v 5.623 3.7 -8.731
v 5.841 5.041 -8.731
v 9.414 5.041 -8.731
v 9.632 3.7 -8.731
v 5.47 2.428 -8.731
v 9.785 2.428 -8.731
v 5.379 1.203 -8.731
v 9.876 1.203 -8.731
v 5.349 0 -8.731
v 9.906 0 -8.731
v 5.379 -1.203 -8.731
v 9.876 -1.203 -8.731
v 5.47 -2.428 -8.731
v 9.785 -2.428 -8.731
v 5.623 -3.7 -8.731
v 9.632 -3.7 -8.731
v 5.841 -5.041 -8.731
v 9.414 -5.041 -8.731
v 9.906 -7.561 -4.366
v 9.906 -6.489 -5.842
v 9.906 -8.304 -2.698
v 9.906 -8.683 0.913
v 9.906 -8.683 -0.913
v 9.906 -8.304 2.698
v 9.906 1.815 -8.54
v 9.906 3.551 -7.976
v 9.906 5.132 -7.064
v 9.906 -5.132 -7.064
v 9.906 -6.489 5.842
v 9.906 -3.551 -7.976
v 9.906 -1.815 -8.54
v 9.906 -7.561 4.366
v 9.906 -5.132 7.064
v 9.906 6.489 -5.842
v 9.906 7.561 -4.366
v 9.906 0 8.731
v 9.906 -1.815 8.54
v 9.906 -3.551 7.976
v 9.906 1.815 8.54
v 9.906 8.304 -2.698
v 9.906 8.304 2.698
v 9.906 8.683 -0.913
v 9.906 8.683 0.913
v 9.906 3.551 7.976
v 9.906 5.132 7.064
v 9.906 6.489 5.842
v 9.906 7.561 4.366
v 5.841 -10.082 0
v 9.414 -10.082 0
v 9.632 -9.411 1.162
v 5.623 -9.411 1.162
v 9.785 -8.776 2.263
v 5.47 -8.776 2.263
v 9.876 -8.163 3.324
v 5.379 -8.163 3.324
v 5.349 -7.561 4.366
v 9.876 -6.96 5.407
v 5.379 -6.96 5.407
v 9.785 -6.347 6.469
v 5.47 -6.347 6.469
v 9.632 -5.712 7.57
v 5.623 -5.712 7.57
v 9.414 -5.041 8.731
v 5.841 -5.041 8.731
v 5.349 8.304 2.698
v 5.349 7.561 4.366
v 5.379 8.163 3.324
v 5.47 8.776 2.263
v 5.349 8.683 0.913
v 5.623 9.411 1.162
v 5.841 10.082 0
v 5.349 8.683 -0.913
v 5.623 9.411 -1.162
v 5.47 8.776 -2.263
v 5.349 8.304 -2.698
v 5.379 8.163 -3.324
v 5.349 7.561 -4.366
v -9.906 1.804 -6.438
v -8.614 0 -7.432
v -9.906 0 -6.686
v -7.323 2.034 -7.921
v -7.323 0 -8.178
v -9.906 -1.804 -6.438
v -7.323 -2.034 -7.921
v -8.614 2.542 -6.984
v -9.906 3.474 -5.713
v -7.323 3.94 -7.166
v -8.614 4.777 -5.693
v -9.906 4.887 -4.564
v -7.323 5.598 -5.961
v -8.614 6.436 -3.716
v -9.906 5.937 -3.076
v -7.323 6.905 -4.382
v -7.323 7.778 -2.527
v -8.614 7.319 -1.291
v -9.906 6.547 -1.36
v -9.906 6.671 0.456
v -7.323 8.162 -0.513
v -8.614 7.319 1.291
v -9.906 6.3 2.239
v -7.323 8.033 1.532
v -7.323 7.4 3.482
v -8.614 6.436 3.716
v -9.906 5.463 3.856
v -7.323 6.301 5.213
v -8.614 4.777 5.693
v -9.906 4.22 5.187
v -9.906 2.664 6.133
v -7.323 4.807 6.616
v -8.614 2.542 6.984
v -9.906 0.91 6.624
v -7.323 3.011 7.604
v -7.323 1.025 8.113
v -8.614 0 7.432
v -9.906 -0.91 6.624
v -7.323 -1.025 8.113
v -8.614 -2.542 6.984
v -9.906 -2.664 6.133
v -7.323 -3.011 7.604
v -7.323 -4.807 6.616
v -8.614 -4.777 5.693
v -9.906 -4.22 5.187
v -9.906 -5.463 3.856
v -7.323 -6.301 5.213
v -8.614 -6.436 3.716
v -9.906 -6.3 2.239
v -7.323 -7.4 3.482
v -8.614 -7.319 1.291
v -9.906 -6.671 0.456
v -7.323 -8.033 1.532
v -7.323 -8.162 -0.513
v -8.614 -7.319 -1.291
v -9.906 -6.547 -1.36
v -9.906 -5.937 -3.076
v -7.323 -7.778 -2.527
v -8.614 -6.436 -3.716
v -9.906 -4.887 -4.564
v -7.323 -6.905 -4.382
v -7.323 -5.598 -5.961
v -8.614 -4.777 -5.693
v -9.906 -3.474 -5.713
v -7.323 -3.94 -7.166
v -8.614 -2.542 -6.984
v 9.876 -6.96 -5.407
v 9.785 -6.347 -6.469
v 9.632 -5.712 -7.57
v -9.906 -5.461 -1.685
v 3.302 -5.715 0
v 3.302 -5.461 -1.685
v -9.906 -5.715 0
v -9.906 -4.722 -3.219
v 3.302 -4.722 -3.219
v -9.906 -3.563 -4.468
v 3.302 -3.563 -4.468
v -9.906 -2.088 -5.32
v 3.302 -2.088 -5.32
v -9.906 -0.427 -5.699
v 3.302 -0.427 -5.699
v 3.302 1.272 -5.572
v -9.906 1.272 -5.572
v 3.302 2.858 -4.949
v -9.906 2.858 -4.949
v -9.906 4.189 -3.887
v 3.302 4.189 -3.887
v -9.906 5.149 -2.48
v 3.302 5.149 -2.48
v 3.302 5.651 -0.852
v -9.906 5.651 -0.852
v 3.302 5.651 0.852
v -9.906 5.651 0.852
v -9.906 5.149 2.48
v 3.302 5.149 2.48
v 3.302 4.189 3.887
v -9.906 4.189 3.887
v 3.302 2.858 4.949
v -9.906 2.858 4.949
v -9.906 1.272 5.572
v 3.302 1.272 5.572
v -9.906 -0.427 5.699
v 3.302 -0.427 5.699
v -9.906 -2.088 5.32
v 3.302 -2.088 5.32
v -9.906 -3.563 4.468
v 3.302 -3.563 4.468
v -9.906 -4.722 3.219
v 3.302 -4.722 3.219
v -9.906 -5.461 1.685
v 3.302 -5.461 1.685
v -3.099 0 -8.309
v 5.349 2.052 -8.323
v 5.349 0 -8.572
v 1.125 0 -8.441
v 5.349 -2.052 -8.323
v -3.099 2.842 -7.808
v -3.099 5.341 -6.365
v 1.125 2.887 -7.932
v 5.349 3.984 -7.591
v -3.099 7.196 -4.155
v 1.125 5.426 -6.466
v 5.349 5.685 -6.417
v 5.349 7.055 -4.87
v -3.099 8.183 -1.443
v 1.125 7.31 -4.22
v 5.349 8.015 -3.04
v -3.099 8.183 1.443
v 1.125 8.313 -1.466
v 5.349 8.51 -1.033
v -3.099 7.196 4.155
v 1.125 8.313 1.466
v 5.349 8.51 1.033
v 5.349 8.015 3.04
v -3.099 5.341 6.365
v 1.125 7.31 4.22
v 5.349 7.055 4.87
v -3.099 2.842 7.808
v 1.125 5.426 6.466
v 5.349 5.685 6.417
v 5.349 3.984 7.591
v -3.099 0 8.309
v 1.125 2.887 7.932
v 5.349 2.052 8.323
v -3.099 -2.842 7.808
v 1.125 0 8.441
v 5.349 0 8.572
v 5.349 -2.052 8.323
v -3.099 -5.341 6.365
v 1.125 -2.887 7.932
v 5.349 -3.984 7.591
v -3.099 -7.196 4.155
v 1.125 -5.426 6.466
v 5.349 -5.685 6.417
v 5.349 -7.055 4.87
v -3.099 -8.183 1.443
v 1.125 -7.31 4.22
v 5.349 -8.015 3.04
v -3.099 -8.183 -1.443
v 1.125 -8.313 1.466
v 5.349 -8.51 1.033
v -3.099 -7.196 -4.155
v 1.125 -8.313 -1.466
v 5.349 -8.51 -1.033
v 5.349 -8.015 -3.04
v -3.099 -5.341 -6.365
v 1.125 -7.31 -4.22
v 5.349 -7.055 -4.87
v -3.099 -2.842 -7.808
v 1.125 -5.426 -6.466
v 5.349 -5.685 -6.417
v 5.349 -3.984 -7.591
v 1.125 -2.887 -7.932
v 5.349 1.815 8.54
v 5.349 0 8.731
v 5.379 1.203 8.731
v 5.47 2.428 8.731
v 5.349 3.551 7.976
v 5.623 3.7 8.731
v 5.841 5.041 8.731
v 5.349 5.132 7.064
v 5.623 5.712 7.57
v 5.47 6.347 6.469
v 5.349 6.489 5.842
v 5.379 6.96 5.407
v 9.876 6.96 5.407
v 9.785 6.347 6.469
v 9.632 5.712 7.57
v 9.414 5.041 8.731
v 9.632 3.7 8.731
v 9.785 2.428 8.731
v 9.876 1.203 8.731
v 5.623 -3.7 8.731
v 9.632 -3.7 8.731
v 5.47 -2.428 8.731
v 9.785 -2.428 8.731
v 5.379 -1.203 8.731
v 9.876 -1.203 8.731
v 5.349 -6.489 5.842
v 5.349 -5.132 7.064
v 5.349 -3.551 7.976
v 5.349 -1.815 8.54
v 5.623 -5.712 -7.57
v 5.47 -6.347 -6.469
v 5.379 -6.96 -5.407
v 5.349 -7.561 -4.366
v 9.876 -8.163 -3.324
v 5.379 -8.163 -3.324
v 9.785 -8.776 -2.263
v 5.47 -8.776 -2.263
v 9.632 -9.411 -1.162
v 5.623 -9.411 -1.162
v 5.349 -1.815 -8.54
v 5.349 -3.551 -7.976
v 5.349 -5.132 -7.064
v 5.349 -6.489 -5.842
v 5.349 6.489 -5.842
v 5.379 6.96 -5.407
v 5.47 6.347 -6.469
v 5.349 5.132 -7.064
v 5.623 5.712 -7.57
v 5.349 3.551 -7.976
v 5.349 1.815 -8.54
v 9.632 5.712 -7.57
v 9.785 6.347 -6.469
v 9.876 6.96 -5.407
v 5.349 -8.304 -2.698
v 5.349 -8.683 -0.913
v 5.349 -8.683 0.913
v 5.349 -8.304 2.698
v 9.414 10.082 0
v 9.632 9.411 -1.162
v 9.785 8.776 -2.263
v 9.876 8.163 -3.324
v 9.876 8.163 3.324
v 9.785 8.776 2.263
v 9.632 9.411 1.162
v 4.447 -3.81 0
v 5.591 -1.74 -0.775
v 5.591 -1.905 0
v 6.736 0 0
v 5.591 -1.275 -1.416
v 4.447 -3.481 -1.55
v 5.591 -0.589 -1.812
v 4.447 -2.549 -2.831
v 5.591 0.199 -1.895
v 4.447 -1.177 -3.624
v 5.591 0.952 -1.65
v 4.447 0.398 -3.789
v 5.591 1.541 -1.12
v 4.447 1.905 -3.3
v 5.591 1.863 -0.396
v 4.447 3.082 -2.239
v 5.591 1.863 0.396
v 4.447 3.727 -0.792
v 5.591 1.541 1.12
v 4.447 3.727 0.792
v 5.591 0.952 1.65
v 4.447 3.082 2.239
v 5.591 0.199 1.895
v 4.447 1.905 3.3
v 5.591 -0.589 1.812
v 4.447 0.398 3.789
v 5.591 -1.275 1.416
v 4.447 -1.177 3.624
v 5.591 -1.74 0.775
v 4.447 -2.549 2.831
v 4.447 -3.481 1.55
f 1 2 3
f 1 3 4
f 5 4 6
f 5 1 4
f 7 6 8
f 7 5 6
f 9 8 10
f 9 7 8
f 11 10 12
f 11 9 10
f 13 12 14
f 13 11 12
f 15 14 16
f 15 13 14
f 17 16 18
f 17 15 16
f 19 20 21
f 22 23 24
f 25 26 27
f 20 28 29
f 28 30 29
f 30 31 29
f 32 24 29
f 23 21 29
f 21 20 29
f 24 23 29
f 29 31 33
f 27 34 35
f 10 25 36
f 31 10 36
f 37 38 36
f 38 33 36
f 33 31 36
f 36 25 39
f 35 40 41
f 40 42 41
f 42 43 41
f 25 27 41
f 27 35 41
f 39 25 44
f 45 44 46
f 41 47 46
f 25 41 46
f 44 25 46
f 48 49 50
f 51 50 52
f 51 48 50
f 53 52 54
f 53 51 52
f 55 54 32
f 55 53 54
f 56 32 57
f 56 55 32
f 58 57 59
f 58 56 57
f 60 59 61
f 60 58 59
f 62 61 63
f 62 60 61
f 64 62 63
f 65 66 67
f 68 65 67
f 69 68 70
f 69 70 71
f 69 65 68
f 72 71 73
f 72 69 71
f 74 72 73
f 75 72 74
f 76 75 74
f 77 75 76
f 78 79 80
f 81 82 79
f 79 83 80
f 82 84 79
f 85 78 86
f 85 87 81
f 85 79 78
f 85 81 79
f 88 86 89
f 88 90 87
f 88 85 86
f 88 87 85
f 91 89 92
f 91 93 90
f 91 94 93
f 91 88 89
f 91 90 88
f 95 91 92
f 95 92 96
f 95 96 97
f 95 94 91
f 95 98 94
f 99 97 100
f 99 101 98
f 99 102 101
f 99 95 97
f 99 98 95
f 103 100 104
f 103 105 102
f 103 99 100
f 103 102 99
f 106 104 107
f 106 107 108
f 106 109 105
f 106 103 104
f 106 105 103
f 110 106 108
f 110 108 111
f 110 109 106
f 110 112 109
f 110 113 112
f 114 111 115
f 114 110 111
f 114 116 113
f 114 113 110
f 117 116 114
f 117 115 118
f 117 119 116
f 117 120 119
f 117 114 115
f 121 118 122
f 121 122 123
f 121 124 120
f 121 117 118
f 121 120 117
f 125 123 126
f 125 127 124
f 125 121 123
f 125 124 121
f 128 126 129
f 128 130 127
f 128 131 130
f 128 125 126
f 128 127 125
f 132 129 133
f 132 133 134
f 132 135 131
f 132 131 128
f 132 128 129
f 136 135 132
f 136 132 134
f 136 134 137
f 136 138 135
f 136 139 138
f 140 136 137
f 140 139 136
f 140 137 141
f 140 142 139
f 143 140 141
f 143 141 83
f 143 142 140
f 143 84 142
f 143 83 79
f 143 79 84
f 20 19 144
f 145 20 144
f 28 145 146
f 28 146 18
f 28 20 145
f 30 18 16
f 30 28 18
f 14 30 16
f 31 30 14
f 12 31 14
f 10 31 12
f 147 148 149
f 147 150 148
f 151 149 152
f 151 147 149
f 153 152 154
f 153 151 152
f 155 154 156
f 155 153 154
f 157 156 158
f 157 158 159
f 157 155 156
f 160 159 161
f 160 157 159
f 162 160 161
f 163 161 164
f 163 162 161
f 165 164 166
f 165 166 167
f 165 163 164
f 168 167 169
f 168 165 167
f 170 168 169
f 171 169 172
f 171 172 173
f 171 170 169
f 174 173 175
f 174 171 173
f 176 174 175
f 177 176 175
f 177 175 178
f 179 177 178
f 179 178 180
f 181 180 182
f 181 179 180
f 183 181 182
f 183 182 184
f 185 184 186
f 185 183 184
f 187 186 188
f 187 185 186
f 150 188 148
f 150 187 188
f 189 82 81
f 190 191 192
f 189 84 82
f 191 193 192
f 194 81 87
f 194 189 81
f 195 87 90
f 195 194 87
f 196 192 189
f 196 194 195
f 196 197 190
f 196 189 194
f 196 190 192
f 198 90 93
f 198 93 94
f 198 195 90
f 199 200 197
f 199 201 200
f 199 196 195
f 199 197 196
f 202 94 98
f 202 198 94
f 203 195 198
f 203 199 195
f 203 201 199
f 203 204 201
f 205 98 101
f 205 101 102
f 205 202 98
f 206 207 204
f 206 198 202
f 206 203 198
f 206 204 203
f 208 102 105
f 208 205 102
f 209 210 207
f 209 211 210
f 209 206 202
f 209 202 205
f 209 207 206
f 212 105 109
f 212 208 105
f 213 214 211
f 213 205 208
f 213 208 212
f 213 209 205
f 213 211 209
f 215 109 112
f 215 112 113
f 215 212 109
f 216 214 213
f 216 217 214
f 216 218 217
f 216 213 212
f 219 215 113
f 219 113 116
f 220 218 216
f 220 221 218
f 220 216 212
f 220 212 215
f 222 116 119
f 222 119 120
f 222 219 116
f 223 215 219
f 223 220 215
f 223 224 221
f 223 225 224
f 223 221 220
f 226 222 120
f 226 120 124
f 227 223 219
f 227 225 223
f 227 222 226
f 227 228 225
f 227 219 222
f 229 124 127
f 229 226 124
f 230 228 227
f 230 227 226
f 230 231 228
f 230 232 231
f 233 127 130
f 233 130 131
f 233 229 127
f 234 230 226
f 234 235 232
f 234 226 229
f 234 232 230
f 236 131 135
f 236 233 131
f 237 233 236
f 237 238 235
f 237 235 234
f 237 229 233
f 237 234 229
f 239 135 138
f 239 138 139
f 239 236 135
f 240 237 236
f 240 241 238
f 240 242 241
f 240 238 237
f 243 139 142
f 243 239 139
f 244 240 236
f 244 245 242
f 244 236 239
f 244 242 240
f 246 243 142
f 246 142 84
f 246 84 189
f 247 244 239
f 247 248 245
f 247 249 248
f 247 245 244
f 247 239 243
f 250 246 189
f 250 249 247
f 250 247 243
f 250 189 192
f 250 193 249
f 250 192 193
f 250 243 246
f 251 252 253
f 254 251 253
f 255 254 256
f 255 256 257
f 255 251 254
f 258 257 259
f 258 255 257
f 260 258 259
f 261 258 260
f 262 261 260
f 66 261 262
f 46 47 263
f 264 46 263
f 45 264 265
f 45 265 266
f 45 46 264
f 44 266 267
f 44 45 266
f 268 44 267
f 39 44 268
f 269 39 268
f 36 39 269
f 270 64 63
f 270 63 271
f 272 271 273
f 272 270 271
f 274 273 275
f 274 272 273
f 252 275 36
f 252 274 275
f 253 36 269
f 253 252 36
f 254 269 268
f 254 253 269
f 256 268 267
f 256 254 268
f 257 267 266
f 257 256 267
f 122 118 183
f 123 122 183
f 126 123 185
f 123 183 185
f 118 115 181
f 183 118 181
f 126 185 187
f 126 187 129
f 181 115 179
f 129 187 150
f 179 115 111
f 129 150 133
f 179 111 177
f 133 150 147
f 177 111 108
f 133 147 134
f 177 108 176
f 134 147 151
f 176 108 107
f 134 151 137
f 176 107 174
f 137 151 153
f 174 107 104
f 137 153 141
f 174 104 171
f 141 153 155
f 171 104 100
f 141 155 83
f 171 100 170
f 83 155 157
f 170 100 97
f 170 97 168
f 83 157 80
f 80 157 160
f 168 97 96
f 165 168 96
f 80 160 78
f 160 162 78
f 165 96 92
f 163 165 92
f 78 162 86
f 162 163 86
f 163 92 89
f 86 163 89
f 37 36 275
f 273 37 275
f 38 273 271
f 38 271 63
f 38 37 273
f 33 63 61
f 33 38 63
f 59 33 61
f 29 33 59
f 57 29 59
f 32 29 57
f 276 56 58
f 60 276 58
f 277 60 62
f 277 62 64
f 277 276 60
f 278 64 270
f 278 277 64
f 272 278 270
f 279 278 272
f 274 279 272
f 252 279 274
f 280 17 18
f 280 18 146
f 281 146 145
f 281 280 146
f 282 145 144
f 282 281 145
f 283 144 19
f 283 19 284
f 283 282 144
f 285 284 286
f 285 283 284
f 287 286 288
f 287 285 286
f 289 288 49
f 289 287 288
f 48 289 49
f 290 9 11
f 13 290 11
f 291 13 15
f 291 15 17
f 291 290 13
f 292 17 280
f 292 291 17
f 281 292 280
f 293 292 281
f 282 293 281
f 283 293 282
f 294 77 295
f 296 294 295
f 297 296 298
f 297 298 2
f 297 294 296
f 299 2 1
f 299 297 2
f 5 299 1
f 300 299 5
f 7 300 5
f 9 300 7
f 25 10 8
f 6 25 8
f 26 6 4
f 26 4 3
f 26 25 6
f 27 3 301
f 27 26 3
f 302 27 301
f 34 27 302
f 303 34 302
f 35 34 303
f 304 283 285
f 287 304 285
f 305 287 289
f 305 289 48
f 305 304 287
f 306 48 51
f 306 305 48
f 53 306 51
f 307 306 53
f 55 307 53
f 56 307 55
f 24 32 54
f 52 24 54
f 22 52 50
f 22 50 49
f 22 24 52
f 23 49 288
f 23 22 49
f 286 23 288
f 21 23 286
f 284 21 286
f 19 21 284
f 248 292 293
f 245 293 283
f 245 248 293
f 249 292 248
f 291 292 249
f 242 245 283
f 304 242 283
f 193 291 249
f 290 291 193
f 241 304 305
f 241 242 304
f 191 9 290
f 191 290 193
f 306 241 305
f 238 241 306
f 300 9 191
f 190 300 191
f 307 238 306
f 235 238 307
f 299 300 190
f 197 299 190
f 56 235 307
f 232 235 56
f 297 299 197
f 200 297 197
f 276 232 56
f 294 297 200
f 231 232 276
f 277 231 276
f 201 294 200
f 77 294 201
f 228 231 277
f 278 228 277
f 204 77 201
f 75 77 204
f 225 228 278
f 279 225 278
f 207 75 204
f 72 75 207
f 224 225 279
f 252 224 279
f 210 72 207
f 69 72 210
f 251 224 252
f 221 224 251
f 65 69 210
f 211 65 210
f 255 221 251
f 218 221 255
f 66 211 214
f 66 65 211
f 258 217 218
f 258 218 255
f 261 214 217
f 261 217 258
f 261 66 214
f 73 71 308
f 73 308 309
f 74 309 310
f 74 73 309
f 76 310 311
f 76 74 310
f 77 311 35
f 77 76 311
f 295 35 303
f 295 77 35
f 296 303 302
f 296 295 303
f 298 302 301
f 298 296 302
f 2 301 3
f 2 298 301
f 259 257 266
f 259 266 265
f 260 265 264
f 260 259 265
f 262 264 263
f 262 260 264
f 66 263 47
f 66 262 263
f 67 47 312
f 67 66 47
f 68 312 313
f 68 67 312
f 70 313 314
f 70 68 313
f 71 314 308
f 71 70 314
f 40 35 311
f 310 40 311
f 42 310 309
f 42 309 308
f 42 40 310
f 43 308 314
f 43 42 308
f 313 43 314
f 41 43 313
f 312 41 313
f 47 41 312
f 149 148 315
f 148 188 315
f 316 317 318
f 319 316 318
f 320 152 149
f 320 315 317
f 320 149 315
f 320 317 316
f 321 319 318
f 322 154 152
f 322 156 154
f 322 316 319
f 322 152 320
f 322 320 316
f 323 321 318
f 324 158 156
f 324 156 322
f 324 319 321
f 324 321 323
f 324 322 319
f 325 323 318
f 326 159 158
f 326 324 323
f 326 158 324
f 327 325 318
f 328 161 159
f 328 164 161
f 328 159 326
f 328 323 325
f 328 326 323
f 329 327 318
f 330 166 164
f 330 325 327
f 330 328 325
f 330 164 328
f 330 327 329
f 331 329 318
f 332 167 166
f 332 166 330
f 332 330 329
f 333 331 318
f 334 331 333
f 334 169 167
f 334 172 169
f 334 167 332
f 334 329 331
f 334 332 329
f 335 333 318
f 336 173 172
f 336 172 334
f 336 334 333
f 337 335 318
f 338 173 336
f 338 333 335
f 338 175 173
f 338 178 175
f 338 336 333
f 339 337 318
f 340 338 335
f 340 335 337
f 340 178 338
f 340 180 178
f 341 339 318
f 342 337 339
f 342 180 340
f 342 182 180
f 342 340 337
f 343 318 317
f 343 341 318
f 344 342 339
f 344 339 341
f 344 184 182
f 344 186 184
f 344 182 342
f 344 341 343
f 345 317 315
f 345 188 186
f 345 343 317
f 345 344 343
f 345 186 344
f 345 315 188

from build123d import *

# Parameters (mm, degrees)
SKETCH2_R          = 8.5725
EXTRUDE1_DEPTH     = 15.25524
EXTRUDE1_DRAFT     = -1.783333333
CHAMFER1_SIZE      = 1.411111111
CHAMFER1_SIZE2     = 2.584686345
EXTRUDE2_DEPTH     = 4.55676
SKETCH4_OUTSIDE_W  = 162.838
SKETCH4_OUTSIDE_H  = 165.54
SKETCH4_OUTSIDE_R  = 8.73125
CUT_EXTRUDE1_DEPTH = 24.882972442
CUT_EXTRUDE1_DRAFT = -70
SKETCH10_OUTSIDE_W = 142.948
SKETCH10_OUTSIDE_H = 145.65
SKETCH10_OUTSIDE_R = 8.73125
CUT_EXTRUDE2_DEPTH = 21.263350565
CUT_EXTRUDE2_DRAFT = -70


with BuildPart() as part:
    # Sketch2 → Extrude1 (with draft: the straight prism first)
    with BuildSketch(Plane(origin=(5.34924, 0, 0), x_dir=(0, 0, -1), z_dir=(1, 0, 0))):
        Circle(SKETCH2_R)
    extrude(amount=-EXTRUDE1_DEPTH)
    # Extrude1: the draft: its side faces are tilted about the plane it starts from
    extrude1_sides = [part.faces().sort_by_distance(p)[0] for p in [
        (-2.27838, 0, 8.5725),
    ]]
    draft(extrude1_sides, Plane(origin=(5.34924, 0, 0), x_dir=(0, 0, -1), z_dir=(1, 0, 0)), EXTRUDE1_DRAFT)

    # Chamfer1
    chamfer1_edges = [part.edges().sort_by_distance(p)[0] for p in [
        (-9.906, 0, 8.097526681),
    ]]
    chamfer1_side = [part.faces().sort_by_distance(p)[0] for p in [
        (-9.906, 0, 0),
    ]]
    chamfer(chamfer1_edges, length=CHAMFER1_SIZE, length2=CHAMFER1_SIZE2, reference=chamfer1_side[0])

    # Sketch3 → Extrude2 (add)
    with BuildSketch(Plane.ZY.offset(-5.34924)):
        Polygon((8.73125, 5.040989538), (0, 10.081979076), (-8.73125, 5.040989538), (-8.73125, -5.040989538), (0, -10.081979076), (8.73125, -5.040989538), align=None)
    extrude(amount=-EXTRUDE2_DEPTH)


with BuildPart() as cut_extrude1_tool:
    # Sketch4 outside → Cut-Extrude1 (with draft: the straight prism first)
    with BuildSketch(Plane(origin=(9.906, 0, 0), x_dir=(0, 0, -1), z_dir=(1, 0, 0))):
        Rectangle(SKETCH4_OUTSIDE_W, SKETCH4_OUTSIDE_H)
        Circle(SKETCH4_OUTSIDE_R, mode=Mode.SUBTRACT)
    extrude(amount=-CUT_EXTRUDE1_DEPTH)
    # Cut-Extrude1: the draft: its side faces are tilted about the plane it starts from
    cut_extrude1_sides = [cut_extrude1_tool.faces().sort_by_distance(p)[0] for p in [
        (-2.535486221, -82.77, 0),
        (-2.535486221, 0, -81.419),
        (-2.535486221, 82.77, 0),
        (-2.535486221, 0, 81.419),
        (-2.535486221, 0, 8.73125),
    ]]
    draft(cut_extrude1_sides, Plane(origin=(9.906, 0, 0), x_dir=(0, 0, -1), z_dir=(1, 0, 0)), CUT_EXTRUDE1_DRAFT)


with BuildPart() as part_1:
    add(part.part)

    # Cut-Extrude1: cut by cut_extrude1_tool
    add(cut_extrude1_tool.part, mode=Mode.SUBTRACT)


with BuildPart() as cut_extrude2_tool:
    # Sketch10 outside → Cut-Extrude2 (with draft: the straight prism first)
    with BuildSketch(Plane.ZY.offset(-5.34924)):
        Rectangle(SKETCH10_OUTSIDE_W, SKETCH10_OUTSIDE_H)
        Circle(SKETCH10_OUTSIDE_R, mode=Mode.SUBTRACT)
    extrude(amount=-CUT_EXTRUDE2_DEPTH)
    # Cut-Extrude2: the draft: its side faces are tilted about the plane it starts from
    cut_extrude2_sides = [cut_extrude2_tool.faces().sort_by_distance(p)[0] for p in [
        (15.980915282, -72.825, 0),
        (15.980915282, 0, 71.474),
        (15.980915282, 72.825, 0),
        (15.980915282, 0, -71.474),
        (15.980915282, 0, -8.73125),
    ]]
    draft(cut_extrude2_sides, Plane.ZY.offset(-5.34924), CUT_EXTRUDE2_DRAFT)


with BuildPart() as part_2:
    add(part_1.part)

    # Cut-Extrude2: cut by cut_extrude2_tool
    add(cut_extrude2_tool.part, mode=Mode.SUBTRACT)

    # Sketch12 → Cut-Revolve1 (revolve, cut)
    with BuildSketch(Plane.XY, mode=Mode.PRIVATE) as cut_revolve1_sk:
        Polygon((-9.906, 0), (6.735918438, 0), (3.302, 5.715), (-9.906, 5.715), align=None)
    revolve(cut_revolve1_sk.sketch.rotate(Axis((6.735918438, 0, 0), (1, 0, 0)), 180), axis=Axis((6.735918438, 0, 0), (1, 0, 0)), mode=Mode.SUBTRACT)


solid = part_2.part
